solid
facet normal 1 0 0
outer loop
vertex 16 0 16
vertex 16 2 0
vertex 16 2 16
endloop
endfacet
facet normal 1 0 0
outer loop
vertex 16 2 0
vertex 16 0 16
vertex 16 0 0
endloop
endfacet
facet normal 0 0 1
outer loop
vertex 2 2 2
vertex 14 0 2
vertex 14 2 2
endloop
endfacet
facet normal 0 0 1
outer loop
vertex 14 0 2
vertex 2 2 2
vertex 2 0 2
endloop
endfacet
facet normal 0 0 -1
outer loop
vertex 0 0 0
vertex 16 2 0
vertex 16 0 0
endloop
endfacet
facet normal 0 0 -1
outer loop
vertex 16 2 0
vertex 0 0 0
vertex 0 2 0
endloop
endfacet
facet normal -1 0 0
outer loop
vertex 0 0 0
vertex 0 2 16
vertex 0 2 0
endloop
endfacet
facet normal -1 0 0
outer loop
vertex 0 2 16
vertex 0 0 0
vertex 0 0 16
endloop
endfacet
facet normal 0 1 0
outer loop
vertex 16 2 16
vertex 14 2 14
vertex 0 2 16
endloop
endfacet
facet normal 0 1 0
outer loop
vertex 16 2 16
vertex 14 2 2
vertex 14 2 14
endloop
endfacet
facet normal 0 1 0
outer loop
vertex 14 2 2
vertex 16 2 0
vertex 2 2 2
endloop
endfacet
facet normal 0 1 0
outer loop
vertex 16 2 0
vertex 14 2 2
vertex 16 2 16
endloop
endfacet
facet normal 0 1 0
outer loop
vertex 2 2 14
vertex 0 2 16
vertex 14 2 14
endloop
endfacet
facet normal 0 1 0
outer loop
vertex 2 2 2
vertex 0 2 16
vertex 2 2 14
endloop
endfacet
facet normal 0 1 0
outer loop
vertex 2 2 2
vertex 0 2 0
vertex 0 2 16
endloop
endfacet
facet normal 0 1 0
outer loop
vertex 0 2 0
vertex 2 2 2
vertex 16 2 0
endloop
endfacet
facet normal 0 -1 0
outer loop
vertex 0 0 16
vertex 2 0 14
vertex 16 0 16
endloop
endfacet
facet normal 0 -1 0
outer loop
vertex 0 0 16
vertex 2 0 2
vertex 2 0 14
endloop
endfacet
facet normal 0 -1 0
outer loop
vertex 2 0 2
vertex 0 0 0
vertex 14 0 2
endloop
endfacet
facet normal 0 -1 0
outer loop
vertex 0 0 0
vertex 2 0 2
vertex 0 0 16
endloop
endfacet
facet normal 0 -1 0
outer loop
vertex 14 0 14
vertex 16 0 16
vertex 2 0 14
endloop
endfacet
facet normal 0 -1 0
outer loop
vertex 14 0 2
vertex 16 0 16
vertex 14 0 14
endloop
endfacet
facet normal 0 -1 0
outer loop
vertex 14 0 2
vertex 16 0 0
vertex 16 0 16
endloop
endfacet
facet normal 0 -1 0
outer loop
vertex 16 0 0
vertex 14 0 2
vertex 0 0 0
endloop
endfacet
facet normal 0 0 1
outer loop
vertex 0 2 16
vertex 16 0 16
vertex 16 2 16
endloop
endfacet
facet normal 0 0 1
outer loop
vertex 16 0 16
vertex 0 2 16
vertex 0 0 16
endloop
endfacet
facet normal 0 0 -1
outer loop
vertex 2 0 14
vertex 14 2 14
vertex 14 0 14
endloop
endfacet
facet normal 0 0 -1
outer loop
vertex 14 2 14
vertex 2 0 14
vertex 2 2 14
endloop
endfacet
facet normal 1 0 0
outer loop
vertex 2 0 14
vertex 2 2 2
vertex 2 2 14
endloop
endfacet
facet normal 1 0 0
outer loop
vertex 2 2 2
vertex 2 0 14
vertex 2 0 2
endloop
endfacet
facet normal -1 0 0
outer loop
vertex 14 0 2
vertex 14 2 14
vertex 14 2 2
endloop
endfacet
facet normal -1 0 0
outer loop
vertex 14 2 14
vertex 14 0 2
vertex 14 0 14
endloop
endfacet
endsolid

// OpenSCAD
// U-shaped spring clip.
$fn = 60;
eps = 0.02;
clip_w = 16;
clip_h = 16;
clip_t = 2;
union() { cube([clip_w,clip_t,clip_t]); translate([0,0,clip_h-clip_t]) cube([clip_w,clip_t,clip_t]); cube([clip_t,clip_t,clip_h]); translate([clip_w-clip_t,0,0]) cube([clip_t,clip_t,clip_h]); }
